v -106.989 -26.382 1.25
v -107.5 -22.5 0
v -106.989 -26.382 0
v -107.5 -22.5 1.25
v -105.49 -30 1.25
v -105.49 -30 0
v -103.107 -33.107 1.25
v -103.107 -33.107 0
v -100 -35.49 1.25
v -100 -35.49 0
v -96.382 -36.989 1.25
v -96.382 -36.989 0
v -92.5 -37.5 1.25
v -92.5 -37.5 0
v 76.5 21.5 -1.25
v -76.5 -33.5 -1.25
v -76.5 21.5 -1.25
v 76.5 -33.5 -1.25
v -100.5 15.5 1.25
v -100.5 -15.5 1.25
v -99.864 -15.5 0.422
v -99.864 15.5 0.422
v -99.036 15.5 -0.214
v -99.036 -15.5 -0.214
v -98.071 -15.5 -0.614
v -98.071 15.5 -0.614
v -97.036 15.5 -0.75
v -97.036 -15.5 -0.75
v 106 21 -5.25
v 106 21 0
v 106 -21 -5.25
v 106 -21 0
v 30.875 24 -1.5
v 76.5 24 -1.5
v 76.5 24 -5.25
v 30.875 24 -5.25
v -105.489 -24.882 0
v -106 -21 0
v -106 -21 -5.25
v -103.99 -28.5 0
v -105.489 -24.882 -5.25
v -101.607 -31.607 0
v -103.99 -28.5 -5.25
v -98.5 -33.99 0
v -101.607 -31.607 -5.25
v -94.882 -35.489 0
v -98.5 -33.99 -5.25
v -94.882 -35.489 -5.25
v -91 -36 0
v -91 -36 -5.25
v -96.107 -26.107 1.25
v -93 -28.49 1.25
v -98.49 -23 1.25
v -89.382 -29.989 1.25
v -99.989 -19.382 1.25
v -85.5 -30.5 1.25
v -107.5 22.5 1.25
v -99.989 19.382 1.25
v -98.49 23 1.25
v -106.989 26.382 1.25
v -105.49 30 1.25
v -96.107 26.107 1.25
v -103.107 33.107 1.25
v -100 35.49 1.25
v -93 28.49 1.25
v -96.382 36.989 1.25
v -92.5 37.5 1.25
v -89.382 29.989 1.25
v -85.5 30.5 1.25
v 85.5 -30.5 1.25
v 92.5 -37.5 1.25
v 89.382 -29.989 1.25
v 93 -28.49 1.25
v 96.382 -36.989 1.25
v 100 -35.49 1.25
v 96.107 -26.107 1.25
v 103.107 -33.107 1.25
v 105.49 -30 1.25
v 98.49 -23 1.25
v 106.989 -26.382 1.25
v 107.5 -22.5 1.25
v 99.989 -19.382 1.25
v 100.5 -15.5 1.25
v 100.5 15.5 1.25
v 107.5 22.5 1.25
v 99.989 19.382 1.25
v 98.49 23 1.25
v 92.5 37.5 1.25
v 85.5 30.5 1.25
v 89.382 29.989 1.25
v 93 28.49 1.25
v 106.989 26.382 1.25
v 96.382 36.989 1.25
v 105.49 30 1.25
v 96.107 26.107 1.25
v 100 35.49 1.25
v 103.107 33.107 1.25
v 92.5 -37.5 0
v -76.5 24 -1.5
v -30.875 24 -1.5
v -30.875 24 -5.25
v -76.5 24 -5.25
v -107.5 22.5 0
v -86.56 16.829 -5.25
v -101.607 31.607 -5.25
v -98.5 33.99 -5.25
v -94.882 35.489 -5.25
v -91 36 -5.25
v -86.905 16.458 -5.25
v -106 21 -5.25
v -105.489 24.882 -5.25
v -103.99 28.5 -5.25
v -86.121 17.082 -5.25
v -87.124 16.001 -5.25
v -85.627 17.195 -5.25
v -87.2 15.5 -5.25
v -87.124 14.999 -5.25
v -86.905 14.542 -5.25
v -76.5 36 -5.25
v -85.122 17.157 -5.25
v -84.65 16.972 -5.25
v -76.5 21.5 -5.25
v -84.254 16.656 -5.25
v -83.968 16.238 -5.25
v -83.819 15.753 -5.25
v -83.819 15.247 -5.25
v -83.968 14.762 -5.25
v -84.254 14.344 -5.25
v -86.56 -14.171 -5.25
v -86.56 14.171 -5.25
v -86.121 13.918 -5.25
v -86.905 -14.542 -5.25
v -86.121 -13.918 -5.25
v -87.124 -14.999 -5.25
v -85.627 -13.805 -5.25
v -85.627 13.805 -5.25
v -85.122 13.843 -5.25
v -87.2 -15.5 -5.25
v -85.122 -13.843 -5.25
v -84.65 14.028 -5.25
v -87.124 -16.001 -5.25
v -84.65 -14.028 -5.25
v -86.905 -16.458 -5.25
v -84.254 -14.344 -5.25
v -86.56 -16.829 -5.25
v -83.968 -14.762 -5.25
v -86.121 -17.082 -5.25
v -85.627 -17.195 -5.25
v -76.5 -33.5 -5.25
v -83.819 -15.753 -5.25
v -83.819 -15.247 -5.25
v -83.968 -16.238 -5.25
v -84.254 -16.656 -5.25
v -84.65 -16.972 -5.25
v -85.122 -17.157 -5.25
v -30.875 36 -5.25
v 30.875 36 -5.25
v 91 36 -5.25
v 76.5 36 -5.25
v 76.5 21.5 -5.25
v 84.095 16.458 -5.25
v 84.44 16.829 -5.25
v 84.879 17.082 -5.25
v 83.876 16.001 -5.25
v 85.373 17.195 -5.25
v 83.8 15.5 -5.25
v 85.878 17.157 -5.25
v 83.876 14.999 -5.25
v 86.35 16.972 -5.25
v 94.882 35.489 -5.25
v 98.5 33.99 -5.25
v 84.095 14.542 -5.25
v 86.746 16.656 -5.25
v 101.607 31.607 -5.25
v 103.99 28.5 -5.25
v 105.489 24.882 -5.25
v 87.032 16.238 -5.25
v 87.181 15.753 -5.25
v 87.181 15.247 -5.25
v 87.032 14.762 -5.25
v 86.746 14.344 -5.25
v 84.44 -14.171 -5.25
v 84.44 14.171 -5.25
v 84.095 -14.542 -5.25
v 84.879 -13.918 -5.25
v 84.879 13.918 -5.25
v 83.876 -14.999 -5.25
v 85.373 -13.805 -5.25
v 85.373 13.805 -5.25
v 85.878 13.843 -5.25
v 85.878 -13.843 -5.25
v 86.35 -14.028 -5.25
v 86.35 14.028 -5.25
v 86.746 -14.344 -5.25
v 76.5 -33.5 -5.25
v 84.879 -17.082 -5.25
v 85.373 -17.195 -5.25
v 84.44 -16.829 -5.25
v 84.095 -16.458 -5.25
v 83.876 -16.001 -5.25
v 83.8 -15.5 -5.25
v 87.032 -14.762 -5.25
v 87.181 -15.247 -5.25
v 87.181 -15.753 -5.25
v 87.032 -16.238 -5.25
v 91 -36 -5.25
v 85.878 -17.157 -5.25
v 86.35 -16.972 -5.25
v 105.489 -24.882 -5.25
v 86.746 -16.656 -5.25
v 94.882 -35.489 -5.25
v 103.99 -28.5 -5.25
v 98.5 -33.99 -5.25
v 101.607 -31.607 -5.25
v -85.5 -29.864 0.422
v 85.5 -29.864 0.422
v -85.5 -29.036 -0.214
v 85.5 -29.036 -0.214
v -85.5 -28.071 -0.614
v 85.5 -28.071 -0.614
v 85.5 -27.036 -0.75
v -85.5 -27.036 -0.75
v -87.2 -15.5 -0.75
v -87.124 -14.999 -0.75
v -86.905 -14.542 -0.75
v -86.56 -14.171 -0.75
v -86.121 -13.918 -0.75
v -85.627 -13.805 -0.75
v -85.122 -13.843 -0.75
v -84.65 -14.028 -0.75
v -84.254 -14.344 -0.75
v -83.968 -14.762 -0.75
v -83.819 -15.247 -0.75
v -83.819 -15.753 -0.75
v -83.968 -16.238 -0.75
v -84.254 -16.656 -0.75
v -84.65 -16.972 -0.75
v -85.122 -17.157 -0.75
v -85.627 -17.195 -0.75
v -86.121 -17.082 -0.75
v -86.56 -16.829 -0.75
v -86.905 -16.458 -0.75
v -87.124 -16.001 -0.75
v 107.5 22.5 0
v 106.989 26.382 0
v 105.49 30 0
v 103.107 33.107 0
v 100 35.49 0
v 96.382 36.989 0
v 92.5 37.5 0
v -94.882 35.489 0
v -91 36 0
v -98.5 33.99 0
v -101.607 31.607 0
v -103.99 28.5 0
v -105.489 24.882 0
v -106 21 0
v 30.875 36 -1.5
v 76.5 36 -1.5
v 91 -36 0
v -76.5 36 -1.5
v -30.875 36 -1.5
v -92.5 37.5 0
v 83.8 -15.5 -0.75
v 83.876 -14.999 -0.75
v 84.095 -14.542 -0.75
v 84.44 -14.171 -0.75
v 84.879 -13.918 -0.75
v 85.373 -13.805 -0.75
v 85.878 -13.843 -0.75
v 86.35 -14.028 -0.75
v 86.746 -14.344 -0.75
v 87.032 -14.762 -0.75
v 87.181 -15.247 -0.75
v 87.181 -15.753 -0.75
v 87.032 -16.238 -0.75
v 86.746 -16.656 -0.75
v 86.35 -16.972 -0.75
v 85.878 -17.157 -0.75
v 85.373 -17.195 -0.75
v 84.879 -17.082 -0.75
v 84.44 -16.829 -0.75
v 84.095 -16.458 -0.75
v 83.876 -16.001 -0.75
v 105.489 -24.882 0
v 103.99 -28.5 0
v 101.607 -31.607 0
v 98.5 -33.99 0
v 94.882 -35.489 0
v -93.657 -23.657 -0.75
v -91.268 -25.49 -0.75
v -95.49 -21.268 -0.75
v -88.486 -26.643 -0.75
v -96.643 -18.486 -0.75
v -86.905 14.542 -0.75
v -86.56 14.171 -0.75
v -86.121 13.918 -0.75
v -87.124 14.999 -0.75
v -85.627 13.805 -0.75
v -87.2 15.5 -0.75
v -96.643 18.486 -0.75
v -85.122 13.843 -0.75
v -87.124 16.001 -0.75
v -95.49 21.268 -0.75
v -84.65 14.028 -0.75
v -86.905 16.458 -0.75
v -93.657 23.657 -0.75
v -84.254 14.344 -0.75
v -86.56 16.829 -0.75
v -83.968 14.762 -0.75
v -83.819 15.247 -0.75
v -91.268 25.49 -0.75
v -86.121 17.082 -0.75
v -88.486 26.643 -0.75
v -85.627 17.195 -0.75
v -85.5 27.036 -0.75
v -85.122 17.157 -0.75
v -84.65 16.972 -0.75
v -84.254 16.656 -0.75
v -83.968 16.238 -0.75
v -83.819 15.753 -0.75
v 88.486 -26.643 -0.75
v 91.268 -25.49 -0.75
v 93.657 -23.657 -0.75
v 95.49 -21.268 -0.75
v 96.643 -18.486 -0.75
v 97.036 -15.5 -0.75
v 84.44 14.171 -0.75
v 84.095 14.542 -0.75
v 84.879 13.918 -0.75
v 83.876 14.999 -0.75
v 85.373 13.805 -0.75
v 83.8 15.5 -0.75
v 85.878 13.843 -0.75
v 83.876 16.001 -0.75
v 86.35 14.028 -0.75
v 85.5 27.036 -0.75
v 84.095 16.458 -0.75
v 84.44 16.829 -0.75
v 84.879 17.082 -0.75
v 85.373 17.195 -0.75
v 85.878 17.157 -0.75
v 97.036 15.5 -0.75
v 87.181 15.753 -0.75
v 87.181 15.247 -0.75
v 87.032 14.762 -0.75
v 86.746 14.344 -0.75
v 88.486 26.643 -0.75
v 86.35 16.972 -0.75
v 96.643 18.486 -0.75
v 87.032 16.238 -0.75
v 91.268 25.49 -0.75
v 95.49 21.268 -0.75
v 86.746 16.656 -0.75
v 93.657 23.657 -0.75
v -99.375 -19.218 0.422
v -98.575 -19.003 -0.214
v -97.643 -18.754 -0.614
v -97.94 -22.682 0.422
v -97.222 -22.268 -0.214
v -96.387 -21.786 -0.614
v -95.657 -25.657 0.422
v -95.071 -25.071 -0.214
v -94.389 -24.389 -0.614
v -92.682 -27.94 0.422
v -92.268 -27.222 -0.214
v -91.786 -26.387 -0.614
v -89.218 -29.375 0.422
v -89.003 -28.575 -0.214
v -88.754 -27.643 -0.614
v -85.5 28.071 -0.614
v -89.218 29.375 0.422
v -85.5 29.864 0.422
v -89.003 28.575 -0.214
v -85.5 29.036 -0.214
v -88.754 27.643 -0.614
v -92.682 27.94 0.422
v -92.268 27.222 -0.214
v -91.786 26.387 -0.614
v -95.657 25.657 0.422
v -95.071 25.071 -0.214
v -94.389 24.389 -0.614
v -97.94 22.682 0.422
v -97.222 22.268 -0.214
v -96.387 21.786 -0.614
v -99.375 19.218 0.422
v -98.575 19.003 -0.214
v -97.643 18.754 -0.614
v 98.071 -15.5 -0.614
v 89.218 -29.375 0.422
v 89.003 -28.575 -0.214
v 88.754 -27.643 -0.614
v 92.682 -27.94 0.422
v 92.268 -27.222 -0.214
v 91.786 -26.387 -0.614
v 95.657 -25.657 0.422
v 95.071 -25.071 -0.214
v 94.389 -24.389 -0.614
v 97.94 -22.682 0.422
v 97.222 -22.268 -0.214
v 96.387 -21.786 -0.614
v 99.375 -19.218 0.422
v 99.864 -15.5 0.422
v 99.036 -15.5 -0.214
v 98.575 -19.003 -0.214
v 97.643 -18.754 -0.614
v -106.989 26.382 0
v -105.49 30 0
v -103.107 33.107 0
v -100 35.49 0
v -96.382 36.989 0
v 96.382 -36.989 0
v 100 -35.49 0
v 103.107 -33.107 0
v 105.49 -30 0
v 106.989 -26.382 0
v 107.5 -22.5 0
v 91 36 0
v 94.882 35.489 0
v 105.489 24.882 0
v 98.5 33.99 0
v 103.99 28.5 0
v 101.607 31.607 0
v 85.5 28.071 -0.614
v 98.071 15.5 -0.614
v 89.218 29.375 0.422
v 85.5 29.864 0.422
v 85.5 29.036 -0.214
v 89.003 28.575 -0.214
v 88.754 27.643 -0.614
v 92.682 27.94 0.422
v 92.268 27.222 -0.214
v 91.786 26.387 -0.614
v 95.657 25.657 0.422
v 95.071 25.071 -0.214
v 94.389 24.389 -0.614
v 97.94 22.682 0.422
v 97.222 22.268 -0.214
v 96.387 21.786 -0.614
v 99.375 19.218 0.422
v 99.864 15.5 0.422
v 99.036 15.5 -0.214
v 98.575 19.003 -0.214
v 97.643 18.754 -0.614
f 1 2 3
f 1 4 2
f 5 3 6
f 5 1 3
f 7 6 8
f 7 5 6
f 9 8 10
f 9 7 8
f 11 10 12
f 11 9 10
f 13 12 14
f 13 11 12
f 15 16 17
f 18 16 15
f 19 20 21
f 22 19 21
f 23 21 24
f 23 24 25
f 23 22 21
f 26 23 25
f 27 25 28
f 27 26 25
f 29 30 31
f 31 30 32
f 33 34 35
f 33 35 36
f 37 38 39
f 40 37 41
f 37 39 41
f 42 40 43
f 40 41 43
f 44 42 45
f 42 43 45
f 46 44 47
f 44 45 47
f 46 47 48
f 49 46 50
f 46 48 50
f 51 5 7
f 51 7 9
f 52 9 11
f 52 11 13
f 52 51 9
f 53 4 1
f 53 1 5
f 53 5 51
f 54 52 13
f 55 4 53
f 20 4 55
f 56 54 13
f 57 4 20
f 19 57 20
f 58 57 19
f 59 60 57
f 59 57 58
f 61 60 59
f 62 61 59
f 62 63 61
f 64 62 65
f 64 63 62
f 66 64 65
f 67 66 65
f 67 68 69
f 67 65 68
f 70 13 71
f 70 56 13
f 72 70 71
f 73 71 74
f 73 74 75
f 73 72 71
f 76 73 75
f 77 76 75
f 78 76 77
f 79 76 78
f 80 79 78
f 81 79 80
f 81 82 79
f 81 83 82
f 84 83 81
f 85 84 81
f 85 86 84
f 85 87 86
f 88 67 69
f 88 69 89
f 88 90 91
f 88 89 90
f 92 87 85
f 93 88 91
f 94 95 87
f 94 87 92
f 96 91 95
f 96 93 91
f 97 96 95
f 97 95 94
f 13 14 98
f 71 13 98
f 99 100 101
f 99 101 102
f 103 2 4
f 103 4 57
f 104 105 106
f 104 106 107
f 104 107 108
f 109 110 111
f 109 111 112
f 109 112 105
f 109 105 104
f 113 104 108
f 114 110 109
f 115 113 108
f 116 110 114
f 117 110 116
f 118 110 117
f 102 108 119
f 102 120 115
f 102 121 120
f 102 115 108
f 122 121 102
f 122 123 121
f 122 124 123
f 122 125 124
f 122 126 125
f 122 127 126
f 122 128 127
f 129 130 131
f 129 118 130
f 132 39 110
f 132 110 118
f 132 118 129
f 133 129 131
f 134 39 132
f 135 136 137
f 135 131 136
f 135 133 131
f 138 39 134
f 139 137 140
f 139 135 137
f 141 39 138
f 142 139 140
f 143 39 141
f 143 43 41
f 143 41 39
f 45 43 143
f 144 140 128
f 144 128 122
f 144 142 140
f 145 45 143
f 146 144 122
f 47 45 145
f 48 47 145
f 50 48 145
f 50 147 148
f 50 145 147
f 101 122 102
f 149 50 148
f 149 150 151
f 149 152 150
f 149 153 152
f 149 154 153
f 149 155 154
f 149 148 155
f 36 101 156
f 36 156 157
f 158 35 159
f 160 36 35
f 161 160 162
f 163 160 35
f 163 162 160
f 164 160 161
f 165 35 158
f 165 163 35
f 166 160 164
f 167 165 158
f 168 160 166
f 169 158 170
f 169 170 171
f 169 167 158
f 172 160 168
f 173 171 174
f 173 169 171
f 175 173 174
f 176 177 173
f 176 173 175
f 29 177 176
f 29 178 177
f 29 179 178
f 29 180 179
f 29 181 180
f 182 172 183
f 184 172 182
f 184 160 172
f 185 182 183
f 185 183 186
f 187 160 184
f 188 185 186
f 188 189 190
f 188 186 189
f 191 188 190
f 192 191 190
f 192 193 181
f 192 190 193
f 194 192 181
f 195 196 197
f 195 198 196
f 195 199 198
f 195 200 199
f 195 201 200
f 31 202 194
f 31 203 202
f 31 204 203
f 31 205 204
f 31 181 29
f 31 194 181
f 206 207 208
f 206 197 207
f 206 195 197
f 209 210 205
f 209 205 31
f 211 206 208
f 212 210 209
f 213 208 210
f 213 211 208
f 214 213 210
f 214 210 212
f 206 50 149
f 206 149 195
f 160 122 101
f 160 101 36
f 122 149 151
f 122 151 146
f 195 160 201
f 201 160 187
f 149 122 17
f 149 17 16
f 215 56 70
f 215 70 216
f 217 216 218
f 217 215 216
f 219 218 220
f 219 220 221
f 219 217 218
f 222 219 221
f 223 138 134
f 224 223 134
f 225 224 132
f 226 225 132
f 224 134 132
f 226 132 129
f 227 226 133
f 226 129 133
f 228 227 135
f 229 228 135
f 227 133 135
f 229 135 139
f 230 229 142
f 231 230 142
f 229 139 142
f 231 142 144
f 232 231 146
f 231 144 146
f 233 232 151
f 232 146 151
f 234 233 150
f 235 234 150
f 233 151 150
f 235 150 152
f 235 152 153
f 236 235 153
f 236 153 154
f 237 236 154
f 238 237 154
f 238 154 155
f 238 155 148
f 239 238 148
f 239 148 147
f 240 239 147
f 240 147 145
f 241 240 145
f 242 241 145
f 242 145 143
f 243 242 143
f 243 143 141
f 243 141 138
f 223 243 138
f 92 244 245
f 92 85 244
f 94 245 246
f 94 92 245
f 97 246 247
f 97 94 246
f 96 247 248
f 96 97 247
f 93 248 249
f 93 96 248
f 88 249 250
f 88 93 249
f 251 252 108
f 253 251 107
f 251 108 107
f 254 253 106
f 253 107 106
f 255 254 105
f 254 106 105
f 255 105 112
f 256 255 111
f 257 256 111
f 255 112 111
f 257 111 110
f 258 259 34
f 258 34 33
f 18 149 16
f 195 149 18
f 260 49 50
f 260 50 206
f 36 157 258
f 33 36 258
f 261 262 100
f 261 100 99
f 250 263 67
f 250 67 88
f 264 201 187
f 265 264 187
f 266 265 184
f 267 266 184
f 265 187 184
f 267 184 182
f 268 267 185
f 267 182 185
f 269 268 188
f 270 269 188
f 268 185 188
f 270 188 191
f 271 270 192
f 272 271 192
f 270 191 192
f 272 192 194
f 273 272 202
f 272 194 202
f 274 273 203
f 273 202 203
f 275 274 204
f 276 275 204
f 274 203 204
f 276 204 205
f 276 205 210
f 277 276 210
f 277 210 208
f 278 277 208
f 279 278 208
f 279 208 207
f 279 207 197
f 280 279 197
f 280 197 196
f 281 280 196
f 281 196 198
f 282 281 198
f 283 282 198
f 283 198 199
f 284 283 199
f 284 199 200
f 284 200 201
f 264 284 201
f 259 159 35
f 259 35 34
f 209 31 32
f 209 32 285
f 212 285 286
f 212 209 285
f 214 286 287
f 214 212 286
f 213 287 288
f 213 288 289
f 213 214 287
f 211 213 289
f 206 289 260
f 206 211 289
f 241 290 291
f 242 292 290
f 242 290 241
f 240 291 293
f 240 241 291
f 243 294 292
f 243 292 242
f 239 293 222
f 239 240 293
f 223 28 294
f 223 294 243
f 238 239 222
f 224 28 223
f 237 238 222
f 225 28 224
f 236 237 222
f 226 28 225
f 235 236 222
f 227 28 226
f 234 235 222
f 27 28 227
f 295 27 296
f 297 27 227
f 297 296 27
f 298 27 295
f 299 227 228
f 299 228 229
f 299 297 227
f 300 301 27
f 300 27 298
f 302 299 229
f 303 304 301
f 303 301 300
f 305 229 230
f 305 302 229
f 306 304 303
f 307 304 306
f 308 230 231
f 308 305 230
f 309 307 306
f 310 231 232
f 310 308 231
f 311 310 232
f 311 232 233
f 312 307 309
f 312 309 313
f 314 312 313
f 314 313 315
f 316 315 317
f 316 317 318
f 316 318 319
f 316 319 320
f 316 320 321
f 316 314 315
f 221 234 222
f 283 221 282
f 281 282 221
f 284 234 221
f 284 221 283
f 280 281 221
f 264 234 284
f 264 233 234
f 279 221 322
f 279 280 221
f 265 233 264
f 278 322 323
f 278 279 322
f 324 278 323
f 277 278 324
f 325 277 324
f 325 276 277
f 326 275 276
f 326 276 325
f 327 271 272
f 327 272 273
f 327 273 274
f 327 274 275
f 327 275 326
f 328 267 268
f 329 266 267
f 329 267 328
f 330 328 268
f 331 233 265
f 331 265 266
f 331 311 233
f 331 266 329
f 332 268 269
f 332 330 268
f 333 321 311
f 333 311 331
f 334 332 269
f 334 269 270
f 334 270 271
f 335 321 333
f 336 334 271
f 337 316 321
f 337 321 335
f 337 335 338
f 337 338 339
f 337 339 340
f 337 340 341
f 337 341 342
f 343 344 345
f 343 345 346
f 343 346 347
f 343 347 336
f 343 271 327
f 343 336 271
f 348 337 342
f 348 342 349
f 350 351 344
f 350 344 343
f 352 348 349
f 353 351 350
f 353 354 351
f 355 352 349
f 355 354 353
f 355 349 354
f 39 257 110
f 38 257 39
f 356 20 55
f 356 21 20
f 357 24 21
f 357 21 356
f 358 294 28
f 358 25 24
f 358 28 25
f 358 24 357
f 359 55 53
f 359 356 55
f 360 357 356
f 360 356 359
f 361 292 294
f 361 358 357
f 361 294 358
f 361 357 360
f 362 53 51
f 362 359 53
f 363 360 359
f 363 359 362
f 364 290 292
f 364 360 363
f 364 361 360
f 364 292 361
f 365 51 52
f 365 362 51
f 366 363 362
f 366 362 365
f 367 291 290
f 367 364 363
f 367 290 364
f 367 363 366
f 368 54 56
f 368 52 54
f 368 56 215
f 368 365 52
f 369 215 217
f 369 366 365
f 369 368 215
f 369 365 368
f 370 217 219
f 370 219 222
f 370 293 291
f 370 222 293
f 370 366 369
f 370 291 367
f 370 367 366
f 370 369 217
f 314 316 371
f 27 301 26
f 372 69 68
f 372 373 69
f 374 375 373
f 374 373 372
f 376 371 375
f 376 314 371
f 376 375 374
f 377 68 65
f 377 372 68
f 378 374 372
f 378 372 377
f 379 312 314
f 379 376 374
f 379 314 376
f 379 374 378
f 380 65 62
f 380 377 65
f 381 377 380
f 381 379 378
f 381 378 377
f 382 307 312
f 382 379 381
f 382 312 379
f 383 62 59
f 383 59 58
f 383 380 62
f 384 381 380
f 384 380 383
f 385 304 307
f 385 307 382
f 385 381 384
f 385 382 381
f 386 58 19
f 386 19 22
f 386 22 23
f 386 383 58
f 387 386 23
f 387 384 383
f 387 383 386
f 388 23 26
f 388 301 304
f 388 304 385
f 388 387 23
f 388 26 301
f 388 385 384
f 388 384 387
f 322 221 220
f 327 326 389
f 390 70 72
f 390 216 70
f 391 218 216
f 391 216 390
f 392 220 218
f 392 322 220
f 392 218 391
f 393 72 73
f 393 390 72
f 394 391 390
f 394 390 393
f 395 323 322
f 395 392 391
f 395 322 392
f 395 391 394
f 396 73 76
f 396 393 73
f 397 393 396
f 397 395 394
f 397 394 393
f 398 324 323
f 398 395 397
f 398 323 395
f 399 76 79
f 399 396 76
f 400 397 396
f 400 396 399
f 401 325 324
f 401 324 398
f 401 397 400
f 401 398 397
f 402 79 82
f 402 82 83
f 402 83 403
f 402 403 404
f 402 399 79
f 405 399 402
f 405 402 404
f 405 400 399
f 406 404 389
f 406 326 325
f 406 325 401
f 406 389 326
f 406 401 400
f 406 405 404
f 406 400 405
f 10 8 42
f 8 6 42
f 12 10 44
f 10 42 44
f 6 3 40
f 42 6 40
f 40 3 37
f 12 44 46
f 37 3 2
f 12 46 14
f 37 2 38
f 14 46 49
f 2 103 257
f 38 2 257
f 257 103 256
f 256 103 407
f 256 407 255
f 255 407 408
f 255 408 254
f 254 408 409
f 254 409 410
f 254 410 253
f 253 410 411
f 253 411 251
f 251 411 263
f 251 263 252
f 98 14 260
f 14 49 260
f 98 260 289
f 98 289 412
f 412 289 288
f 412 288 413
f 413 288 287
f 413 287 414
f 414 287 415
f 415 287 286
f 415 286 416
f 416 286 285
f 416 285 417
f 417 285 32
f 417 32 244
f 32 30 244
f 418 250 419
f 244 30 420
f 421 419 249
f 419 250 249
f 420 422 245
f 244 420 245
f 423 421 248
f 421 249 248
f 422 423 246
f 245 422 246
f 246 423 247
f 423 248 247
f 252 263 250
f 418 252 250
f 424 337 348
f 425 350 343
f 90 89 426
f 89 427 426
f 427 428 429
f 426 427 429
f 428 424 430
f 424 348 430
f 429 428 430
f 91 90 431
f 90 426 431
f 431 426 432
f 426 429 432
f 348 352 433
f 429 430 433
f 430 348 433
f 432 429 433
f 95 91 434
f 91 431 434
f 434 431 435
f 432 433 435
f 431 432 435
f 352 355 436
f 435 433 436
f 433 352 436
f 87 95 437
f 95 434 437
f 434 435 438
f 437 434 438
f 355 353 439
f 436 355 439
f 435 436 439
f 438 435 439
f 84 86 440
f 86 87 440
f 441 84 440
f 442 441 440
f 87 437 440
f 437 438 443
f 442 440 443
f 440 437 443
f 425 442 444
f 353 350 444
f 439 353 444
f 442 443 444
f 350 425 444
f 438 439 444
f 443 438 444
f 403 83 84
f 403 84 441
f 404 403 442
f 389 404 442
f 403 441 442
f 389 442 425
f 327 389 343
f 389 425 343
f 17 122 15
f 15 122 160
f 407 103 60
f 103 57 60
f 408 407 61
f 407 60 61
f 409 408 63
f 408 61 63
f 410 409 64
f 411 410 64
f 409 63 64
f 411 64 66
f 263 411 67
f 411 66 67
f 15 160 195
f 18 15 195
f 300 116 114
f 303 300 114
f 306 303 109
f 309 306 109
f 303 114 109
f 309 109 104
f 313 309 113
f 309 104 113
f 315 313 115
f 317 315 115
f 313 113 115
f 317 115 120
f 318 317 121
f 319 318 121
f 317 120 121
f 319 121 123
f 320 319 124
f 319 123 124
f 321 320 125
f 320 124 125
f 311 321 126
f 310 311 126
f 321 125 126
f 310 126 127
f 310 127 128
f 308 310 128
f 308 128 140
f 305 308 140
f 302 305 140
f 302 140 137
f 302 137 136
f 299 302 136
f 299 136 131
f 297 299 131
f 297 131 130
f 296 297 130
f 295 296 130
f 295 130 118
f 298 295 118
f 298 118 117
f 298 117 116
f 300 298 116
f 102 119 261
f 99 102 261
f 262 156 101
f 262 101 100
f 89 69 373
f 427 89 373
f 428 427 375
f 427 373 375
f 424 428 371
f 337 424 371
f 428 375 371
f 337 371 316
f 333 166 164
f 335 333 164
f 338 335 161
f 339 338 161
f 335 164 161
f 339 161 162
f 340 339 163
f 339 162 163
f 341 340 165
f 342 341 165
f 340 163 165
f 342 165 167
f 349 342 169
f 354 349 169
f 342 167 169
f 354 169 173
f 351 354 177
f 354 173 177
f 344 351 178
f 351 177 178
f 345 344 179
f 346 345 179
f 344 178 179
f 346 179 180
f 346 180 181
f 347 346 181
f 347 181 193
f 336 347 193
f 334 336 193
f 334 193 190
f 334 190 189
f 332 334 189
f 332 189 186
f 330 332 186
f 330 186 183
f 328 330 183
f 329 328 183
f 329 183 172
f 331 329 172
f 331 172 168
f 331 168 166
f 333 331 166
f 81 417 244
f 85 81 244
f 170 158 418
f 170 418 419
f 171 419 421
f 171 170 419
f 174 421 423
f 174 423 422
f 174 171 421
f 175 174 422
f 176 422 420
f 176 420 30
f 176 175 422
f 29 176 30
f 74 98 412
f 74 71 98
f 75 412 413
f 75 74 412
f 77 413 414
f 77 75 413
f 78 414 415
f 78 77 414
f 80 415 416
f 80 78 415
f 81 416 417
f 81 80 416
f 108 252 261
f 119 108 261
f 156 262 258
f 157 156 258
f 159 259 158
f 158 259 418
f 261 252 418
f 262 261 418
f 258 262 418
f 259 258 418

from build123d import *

# Parameters (mm, degrees)
F0_W          = 215
F0_H          = 75
F1_DEPTH      = 1.25
F2_R          = 15
F3_W          = 212
F3_H          = 72
F4_DEPTH      = 5.25
F5_T1_DEPTH   = 42.75
F7_W          = 201
F7_H          = 61
F8_DEPTH      = 2
F9_R          = 15
F10_T1_DEPTH  = 31
F10_T3_DEPTH  = 171
F10_T6_ANGLE  = 90
F10_T8_ANGLE  = 90
F10_T10_ANGLE = 90
F10_T12_ANGLE = 90
F11_W         = 45.625
F11_H         = 3.75
F12_DEPTH     = 12
F13_W         = 153
F13_H         = 55
F14_DEPTH     = 4
F16_D         = 3.4


# Not quite as in the source:
# - a fillet or chamfer that OpenCascade refuses, or shapes differently, is made with other operations: its cross-section is extruded or revolved along the edge and cut away or added


with BuildPart() as f1:
    # F0 (on Top) → F1 (new body)
    with BuildSketch(Plane.XY):
        Rectangle(F0_W, F0_H)
    extrude(amount=F1_DEPTH)

    # F2
    f2_edges = [f1.edges().sort_by_distance(p)[0] for p in [
        (107.5, -37.5, 0.625),
        (107.5, 37.5, 0.625),
        (-107.5, 37.5, 0.625),
        (-107.5, -37.5, 0.625),
    ]]
    fillet(f2_edges, radius=F2_R)

    # F3 (on face) → F4 (join)
    with BuildSketch(Plane(origin=(0, 0, 0), x_dir=(1, 0, 0), z_dir=(0, 0, -1))):
        Rectangle(F3_W, F3_H)
    extrude(amount=F4_DEPTH)

    # F5: fillet of radius 15 on 4 edges, made by hand

    # F5_s2 → F5_t1 (cut)
    with BuildSketch(Plane.XY.offset(-42.75)):
        with BuildLine():
            ThreePointArc((-106, -21), (-101.6066017178, -31.6066017178), (-91, -36))
            Line((-91, -36), (-106, -36))
            Line((-106, -36), (-106, -21))
        make_face()
        with BuildLine():
            ThreePointArc((-91, 36), (-101.6066017178, 31.6066017178), (-106, 21))
            Line((-106, 21), (-106, 36))
            Line((-106, 36), (-91, 36))
        make_face()
        with BuildLine():
            ThreePointArc((91, 36), (101.6066017178, 31.6066017178), (106, 21))
            Line((106, 21), (106, 36))
            Line((106, 36), (91, 36))
        make_face()
        with BuildLine():
            ThreePointArc((106, -21), (101.6066017178, -31.6066017178), (91, -36))
            Line((91, -36), (106, -36))
            Line((106, -36), (106, -21))
        make_face()
    extrude(amount=F5_T1_DEPTH, mode=Mode.SUBTRACT)

    # F7 (on face) → F8 (cut)
    with BuildSketch(Plane.XY.offset(1.25)):
        Rectangle(F7_W, F7_H)
    extrude(amount=-F8_DEPTH, mode=Mode.SUBTRACT)

    # F9
    f9_edges = [f1.edges().sort_by_distance(p)[0] for p in [
        (-100.5, 30.5, 0.25),
        (-100.5, -30.5, 0.25),
        (100.5, 30.5, 0.25),
        (100.5, -30.5, 0.25),
    ]]
    fillet(f9_edges, radius=F9_R)

    # F10: fillet of radius 4 on 1 edges, made by hand

    # F10_s2 → F10_t1 (join)
    with BuildSketch(Plane.XZ.offset(-15.5)):
        with BuildLine():
            ThreePointArc((-100.5, 1.25), (-99.0358983849, -0.2141016151), (-97.0358983849, -0.75))
            Line((-97.0358983849, -0.75), (-100.5, -0.75))
            Line((-100.5, -0.75), (-100.5, 1.25))
        make_face()
        with BuildLine():
            ThreePointArc((100.5, 1.25), (99.0358983849, -0.2141016151), (97.0358983849, -0.75))
            Line((97.0358983849, -0.75), (100.5, -0.75))
            Line((100.5, -0.75), (100.5, 1.25))
        make_face()
    extrude(amount=F10_T1_DEPTH)

    # F10_s4 → F10_t3 (join)
    with BuildSketch(Plane.YZ.offset(-85.5)):
        with BuildLine():
            ThreePointArc((-30.5, 1.25), (-29.0358983849, -0.2141016151), (-27.0358983849, -0.75))
            Line((-27.0358983849, -0.75), (-30.5, -0.75))
            Line((-30.5, -0.75), (-30.5, 1.25))
        make_face()
        with BuildLine():
            ThreePointArc((30.5, 1.25), (29.0358983849, -0.2141016151), (27.0358983849, -0.75))
            Line((27.0358983849, -0.75), (30.5, -0.75))
            Line((30.5, -0.75), (30.5, 1.25))
        make_face()
    extrude(amount=F10_T3_DEPTH)

    # F10_s5 → F10_t6 (revolve)
    with BuildSketch(Plane.YZ.offset(-85.5)):
        with BuildLine():
            ThreePointArc((30.5, 1.25), (29.0358983849, -0.2141016151), (27.0358983849, -0.75))
            Line((27.0358983849, -0.75), (30.5, -0.75))
            Line((30.5, -0.75), (30.5, 1.25))
        make_face()
    revolve(axis=Axis((-85.5, 15.5, -0.75), (0, 0, 1)), revolution_arc=F10_T6_ANGLE)

    # F10_s7 → F10_t8 (revolve)
    with BuildSketch(Plane.XZ.offset(15.5)):
        with BuildLine():
            ThreePointArc((-100.5, 1.25), (-99.0358983849, -0.2141016151), (-97.0358983849, -0.75))
            Line((-97.0358983849, -0.75), (-100.5, -0.75))
            Line((-100.5, -0.75), (-100.5, 1.25))
        make_face()
    revolve(axis=Axis((-85.5, -15.5, -0.75), (0, 0, 1)), revolution_arc=F10_T8_ANGLE)

    # F10_s9 → F10_t10 (revolve)
    with BuildSketch(Plane.YZ.offset(85.5)):
        with BuildLine():
            ThreePointArc((-30.5, 1.25), (-29.0358983849, -0.2141016151), (-27.0358983849, -0.75))
            Line((-27.0358983849, -0.75), (-30.5, -0.75))
            Line((-30.5, -0.75), (-30.5, 1.25))
        make_face()
    revolve(axis=Axis((85.5, -15.5, -0.75), (0, 0, 1)), revolution_arc=F10_T10_ANGLE)

    # F10_s11 → F10_t12 (revolve)
    with BuildSketch(Plane.YZ.offset(85.5)):
        with BuildLine():
            ThreePointArc((30.5, 1.25), (29.0358983849, -0.2141016151), (27.0358983849, -0.75))
            Line((27.0358983849, -0.75), (30.5, -0.75))
            Line((30.5, -0.75), (30.5, 1.25))
        make_face()
    revolve(axis=Axis((85.5, 15.5, -0.75), (0, 0, -1)), revolution_arc=F10_T12_ANGLE)

    # F11 (on face) → F12 (cut)
    with BuildSketch(Plane(origin=(0, 36, 0), x_dir=(-1, 0, 0), z_dir=(0, 1, 0))):
        with Locations((-53.6875, -3.375)):
            Rectangle(F11_W, F11_H)
        with Locations((53.6875, -3.375)):
            Rectangle(F11_W, F11_H)
    extrude(amount=-F12_DEPTH, mode=Mode.SUBTRACT)

    # F13 (on face) → F14 (cut)
    with BuildSketch(Plane(origin=(0, 0, -5.25), x_dir=(1, 0, 0), z_dir=(0, 0, -1))):
        with Locations((0, 6)):
            Rectangle(F13_W, F13_H)
    extrude(amount=-F14_DEPTH, mode=Mode.SUBTRACT)

    # F16 (through all)
    with Locations(Plane.XY.offset(1.25)):
        with Locations((-85.5, 15.5), (-85.5, -15.5), (85.5, 15.5), (85.5, -15.5)):
            Hole(F16_D / 2)


solid = f1.part
